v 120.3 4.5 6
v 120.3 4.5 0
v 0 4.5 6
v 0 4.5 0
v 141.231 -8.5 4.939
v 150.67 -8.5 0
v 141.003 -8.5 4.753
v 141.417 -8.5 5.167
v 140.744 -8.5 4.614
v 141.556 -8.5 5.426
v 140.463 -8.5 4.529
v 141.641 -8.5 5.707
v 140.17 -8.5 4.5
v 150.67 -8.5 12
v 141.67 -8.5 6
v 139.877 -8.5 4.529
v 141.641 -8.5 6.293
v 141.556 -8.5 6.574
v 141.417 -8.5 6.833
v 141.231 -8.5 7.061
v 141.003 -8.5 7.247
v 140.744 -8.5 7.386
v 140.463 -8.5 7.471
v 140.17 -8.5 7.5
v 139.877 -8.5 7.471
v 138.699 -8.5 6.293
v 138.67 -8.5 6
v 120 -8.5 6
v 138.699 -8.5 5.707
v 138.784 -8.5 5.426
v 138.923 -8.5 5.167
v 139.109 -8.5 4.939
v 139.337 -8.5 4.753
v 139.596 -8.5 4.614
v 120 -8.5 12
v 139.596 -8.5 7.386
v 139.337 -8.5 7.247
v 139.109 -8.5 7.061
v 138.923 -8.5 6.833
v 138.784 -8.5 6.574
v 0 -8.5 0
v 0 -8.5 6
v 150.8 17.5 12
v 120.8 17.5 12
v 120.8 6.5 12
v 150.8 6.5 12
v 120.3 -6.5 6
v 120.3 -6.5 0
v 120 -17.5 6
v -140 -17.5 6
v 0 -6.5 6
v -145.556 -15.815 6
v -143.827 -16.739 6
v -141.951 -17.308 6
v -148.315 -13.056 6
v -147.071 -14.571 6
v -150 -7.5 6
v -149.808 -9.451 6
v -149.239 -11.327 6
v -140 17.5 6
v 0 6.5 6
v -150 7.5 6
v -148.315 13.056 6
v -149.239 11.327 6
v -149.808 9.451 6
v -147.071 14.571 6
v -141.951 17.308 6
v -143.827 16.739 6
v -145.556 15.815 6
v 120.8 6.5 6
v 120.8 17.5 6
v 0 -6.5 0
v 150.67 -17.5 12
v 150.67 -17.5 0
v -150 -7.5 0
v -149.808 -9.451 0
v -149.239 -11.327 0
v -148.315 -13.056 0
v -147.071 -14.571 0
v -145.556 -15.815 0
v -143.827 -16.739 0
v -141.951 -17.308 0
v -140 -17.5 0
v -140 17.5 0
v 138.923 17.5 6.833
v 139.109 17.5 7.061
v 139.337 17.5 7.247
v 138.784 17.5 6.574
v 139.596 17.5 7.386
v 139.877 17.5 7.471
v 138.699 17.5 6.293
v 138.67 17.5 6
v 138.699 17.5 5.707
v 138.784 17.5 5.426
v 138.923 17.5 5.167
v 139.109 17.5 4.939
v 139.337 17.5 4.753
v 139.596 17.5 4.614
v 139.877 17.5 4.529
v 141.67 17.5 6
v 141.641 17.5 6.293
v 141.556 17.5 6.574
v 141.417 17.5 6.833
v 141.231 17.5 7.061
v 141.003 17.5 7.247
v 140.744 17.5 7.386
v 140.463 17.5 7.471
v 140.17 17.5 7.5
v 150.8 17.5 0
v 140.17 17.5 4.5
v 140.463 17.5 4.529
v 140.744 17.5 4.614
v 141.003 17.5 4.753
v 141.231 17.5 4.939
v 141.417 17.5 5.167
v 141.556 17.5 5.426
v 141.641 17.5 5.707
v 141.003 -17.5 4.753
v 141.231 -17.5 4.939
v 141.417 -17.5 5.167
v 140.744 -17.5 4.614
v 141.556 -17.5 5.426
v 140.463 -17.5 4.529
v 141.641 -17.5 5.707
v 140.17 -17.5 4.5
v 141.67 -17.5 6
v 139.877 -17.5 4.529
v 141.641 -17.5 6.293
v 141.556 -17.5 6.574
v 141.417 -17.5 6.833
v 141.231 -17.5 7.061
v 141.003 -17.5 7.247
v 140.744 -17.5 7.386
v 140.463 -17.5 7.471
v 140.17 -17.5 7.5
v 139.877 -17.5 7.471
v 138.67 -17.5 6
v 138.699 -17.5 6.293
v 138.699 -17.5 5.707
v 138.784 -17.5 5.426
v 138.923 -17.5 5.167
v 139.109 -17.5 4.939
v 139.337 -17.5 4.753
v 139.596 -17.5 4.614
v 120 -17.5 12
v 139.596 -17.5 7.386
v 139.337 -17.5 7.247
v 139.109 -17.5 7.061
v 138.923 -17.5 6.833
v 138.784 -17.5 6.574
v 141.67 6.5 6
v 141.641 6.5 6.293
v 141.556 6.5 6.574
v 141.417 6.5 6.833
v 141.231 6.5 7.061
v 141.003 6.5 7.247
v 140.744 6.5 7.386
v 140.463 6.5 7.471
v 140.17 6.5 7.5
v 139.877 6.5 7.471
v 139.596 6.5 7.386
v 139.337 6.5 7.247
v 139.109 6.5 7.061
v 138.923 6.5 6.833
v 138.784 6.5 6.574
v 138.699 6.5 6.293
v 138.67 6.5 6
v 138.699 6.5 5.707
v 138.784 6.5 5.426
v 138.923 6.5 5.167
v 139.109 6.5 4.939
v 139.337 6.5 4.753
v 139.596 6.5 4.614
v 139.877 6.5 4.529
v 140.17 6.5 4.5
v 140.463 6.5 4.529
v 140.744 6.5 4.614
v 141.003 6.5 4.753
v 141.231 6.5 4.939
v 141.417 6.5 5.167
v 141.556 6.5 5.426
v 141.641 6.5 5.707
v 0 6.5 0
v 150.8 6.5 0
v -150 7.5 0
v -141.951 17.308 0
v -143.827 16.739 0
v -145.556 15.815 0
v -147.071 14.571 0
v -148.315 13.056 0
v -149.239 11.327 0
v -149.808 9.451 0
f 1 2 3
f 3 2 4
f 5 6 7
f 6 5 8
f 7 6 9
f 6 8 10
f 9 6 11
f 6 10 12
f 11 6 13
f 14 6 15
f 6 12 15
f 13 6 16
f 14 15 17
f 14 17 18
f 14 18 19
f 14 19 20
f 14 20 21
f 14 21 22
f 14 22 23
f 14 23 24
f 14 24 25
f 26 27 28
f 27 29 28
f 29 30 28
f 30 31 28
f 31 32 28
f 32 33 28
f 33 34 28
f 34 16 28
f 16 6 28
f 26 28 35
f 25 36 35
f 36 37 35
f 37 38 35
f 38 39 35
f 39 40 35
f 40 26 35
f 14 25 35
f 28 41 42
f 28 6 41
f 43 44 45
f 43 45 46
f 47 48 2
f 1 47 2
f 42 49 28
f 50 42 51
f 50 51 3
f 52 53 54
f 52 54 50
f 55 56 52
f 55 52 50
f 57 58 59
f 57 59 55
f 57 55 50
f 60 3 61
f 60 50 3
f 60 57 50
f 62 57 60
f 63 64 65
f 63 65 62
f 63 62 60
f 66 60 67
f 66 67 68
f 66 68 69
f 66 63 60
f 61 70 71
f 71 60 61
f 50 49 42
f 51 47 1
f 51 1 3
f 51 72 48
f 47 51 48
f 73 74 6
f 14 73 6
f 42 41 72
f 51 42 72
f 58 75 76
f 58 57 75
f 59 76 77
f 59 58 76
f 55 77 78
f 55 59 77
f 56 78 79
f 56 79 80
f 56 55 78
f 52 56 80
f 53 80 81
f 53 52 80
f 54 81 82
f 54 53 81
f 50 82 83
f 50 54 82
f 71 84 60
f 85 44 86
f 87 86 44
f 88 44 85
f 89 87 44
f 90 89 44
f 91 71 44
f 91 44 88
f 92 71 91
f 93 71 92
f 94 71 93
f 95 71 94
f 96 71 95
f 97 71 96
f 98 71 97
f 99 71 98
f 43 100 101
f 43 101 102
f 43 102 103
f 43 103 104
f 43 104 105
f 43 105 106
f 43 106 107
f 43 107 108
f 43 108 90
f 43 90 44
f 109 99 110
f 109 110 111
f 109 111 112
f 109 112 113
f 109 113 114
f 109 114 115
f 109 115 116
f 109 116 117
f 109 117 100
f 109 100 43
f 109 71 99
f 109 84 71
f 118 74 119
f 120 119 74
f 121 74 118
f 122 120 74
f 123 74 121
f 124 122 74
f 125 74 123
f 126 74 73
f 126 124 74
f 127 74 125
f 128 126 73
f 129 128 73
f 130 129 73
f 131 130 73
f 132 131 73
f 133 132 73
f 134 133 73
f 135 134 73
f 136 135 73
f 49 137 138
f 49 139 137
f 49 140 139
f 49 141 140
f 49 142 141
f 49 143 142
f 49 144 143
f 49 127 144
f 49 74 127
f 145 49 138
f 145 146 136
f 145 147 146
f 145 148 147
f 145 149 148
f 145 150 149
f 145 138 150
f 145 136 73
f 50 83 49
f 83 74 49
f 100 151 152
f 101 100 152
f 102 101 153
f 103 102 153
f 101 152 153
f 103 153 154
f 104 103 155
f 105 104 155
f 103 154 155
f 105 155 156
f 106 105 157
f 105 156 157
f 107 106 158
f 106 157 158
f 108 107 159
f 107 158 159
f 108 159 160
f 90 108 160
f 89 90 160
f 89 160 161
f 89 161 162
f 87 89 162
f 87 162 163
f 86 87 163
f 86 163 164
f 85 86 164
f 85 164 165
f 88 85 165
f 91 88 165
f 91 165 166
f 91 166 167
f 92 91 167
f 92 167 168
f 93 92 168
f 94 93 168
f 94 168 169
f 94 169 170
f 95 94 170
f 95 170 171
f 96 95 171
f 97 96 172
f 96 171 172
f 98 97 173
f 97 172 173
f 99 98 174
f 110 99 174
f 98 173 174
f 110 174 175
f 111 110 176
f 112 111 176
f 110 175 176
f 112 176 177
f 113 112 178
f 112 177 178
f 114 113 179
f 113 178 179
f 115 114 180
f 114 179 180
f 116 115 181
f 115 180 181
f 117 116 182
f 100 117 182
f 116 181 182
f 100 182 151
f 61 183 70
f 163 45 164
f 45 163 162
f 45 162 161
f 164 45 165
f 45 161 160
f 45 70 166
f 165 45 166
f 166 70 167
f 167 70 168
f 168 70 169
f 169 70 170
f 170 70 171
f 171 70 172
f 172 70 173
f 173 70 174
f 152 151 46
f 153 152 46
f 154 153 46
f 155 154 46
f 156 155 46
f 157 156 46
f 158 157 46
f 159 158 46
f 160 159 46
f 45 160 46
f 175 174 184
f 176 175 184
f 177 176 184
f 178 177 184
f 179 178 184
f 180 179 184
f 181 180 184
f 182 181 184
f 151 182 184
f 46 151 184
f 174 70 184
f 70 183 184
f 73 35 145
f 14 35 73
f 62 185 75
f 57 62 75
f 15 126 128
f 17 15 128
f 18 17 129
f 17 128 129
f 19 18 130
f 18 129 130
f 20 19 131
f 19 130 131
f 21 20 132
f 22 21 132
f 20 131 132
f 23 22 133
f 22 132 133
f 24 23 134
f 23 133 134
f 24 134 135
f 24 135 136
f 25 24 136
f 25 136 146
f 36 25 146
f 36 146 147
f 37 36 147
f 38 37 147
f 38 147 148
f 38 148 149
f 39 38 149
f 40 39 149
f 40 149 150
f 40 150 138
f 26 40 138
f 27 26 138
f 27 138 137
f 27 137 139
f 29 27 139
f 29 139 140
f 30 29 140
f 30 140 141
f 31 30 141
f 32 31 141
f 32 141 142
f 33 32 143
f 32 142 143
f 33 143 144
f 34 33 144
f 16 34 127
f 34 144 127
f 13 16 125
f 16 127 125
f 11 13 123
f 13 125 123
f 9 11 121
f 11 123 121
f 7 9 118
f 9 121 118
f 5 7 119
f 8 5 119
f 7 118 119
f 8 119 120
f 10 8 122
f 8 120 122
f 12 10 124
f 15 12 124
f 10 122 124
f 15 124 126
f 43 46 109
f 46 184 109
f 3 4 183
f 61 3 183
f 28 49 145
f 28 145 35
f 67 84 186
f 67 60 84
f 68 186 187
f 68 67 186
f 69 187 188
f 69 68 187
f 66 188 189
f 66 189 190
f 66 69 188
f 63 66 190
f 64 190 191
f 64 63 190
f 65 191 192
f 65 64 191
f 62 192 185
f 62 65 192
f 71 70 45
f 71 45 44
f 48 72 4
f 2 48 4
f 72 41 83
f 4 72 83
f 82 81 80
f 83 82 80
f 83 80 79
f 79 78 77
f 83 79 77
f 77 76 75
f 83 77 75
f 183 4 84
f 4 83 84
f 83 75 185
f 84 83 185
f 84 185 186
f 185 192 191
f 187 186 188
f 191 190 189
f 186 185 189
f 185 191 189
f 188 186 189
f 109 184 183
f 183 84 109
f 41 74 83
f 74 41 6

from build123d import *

# Parameters (mm, degrees)
F1_DEPTH = 6
F2_R     = 10
F3_DEPTH = 30.67
F4_DEPTH = 30.8
F5_DEPTH = 29.7
F6_W     = 30
F6_H     = 11
F6_W_2   = 30.67
F6_H_2   = 9
F7_DEPTH = 6
F8_R     = 1.5
F9_DEPTH = 37.3


with BuildPart() as f1:
    # F0 (on Top) → F1 (new body)
    with BuildSketch(Plane.XY):
        Polygon((120, 17.5), (-150, 17.5), (-150, -17.5), (120, -17.5), (120, -8.5), (0, -8.5), (0, -6.5), (150, -6.5), (150, 4.5), (0, 4.5), (0, 6.5), (120, 6.5), align=None)
    extrude(amount=F1_DEPTH)

    # F2
    f2_edges = [f1.edges().sort_by_distance(p)[0] for p in [
        (-150, -17.5, 3),
        (-150, 17.5, 3),
    ]]
    fillet(f2_edges, radius=F2_R)

    # F3 (add): a face of the model
    f3_faces = [f1.faces().sort_by_distance(p)[0] for p in [
        (120, -13, 3),
    ]]
    extrude(f3_faces, amount=F3_DEPTH)

    # F4 (add): a face of the model
    f4_faces = [f1.faces().sort_by_distance(p)[0] for p in [
        (120, 12, 3),
    ]]
    extrude(f4_faces, amount=F4_DEPTH)

    # F5 (cut): a face of the model
    f5_faces = [f1.faces().sort_by_distance(p)[0] for p in [
        (150, -1, 3),
    ]]
    extrude(f5_faces, amount=-F5_DEPTH, mode=Mode.SUBTRACT)

    # F6 (on face) → F7 (join)
    with BuildSketch(Plane.XY.offset(6)):
        with Locations((135.8, 12)):
            Rectangle(F6_W, F6_H)
        with Locations((135.335, -13)):
            Rectangle(F6_W_2, F6_H_2)
    extrude(amount=F7_DEPTH)

    # F8 (on face) → F9 (cut)
    with BuildSketch(Plane.XZ.offset(17.5)):
        with Locations((140.17, 6)):
            Circle(F8_R)
    extrude(amount=-F9_DEPTH, mode=Mode.SUBTRACT)


solid = f1.part
